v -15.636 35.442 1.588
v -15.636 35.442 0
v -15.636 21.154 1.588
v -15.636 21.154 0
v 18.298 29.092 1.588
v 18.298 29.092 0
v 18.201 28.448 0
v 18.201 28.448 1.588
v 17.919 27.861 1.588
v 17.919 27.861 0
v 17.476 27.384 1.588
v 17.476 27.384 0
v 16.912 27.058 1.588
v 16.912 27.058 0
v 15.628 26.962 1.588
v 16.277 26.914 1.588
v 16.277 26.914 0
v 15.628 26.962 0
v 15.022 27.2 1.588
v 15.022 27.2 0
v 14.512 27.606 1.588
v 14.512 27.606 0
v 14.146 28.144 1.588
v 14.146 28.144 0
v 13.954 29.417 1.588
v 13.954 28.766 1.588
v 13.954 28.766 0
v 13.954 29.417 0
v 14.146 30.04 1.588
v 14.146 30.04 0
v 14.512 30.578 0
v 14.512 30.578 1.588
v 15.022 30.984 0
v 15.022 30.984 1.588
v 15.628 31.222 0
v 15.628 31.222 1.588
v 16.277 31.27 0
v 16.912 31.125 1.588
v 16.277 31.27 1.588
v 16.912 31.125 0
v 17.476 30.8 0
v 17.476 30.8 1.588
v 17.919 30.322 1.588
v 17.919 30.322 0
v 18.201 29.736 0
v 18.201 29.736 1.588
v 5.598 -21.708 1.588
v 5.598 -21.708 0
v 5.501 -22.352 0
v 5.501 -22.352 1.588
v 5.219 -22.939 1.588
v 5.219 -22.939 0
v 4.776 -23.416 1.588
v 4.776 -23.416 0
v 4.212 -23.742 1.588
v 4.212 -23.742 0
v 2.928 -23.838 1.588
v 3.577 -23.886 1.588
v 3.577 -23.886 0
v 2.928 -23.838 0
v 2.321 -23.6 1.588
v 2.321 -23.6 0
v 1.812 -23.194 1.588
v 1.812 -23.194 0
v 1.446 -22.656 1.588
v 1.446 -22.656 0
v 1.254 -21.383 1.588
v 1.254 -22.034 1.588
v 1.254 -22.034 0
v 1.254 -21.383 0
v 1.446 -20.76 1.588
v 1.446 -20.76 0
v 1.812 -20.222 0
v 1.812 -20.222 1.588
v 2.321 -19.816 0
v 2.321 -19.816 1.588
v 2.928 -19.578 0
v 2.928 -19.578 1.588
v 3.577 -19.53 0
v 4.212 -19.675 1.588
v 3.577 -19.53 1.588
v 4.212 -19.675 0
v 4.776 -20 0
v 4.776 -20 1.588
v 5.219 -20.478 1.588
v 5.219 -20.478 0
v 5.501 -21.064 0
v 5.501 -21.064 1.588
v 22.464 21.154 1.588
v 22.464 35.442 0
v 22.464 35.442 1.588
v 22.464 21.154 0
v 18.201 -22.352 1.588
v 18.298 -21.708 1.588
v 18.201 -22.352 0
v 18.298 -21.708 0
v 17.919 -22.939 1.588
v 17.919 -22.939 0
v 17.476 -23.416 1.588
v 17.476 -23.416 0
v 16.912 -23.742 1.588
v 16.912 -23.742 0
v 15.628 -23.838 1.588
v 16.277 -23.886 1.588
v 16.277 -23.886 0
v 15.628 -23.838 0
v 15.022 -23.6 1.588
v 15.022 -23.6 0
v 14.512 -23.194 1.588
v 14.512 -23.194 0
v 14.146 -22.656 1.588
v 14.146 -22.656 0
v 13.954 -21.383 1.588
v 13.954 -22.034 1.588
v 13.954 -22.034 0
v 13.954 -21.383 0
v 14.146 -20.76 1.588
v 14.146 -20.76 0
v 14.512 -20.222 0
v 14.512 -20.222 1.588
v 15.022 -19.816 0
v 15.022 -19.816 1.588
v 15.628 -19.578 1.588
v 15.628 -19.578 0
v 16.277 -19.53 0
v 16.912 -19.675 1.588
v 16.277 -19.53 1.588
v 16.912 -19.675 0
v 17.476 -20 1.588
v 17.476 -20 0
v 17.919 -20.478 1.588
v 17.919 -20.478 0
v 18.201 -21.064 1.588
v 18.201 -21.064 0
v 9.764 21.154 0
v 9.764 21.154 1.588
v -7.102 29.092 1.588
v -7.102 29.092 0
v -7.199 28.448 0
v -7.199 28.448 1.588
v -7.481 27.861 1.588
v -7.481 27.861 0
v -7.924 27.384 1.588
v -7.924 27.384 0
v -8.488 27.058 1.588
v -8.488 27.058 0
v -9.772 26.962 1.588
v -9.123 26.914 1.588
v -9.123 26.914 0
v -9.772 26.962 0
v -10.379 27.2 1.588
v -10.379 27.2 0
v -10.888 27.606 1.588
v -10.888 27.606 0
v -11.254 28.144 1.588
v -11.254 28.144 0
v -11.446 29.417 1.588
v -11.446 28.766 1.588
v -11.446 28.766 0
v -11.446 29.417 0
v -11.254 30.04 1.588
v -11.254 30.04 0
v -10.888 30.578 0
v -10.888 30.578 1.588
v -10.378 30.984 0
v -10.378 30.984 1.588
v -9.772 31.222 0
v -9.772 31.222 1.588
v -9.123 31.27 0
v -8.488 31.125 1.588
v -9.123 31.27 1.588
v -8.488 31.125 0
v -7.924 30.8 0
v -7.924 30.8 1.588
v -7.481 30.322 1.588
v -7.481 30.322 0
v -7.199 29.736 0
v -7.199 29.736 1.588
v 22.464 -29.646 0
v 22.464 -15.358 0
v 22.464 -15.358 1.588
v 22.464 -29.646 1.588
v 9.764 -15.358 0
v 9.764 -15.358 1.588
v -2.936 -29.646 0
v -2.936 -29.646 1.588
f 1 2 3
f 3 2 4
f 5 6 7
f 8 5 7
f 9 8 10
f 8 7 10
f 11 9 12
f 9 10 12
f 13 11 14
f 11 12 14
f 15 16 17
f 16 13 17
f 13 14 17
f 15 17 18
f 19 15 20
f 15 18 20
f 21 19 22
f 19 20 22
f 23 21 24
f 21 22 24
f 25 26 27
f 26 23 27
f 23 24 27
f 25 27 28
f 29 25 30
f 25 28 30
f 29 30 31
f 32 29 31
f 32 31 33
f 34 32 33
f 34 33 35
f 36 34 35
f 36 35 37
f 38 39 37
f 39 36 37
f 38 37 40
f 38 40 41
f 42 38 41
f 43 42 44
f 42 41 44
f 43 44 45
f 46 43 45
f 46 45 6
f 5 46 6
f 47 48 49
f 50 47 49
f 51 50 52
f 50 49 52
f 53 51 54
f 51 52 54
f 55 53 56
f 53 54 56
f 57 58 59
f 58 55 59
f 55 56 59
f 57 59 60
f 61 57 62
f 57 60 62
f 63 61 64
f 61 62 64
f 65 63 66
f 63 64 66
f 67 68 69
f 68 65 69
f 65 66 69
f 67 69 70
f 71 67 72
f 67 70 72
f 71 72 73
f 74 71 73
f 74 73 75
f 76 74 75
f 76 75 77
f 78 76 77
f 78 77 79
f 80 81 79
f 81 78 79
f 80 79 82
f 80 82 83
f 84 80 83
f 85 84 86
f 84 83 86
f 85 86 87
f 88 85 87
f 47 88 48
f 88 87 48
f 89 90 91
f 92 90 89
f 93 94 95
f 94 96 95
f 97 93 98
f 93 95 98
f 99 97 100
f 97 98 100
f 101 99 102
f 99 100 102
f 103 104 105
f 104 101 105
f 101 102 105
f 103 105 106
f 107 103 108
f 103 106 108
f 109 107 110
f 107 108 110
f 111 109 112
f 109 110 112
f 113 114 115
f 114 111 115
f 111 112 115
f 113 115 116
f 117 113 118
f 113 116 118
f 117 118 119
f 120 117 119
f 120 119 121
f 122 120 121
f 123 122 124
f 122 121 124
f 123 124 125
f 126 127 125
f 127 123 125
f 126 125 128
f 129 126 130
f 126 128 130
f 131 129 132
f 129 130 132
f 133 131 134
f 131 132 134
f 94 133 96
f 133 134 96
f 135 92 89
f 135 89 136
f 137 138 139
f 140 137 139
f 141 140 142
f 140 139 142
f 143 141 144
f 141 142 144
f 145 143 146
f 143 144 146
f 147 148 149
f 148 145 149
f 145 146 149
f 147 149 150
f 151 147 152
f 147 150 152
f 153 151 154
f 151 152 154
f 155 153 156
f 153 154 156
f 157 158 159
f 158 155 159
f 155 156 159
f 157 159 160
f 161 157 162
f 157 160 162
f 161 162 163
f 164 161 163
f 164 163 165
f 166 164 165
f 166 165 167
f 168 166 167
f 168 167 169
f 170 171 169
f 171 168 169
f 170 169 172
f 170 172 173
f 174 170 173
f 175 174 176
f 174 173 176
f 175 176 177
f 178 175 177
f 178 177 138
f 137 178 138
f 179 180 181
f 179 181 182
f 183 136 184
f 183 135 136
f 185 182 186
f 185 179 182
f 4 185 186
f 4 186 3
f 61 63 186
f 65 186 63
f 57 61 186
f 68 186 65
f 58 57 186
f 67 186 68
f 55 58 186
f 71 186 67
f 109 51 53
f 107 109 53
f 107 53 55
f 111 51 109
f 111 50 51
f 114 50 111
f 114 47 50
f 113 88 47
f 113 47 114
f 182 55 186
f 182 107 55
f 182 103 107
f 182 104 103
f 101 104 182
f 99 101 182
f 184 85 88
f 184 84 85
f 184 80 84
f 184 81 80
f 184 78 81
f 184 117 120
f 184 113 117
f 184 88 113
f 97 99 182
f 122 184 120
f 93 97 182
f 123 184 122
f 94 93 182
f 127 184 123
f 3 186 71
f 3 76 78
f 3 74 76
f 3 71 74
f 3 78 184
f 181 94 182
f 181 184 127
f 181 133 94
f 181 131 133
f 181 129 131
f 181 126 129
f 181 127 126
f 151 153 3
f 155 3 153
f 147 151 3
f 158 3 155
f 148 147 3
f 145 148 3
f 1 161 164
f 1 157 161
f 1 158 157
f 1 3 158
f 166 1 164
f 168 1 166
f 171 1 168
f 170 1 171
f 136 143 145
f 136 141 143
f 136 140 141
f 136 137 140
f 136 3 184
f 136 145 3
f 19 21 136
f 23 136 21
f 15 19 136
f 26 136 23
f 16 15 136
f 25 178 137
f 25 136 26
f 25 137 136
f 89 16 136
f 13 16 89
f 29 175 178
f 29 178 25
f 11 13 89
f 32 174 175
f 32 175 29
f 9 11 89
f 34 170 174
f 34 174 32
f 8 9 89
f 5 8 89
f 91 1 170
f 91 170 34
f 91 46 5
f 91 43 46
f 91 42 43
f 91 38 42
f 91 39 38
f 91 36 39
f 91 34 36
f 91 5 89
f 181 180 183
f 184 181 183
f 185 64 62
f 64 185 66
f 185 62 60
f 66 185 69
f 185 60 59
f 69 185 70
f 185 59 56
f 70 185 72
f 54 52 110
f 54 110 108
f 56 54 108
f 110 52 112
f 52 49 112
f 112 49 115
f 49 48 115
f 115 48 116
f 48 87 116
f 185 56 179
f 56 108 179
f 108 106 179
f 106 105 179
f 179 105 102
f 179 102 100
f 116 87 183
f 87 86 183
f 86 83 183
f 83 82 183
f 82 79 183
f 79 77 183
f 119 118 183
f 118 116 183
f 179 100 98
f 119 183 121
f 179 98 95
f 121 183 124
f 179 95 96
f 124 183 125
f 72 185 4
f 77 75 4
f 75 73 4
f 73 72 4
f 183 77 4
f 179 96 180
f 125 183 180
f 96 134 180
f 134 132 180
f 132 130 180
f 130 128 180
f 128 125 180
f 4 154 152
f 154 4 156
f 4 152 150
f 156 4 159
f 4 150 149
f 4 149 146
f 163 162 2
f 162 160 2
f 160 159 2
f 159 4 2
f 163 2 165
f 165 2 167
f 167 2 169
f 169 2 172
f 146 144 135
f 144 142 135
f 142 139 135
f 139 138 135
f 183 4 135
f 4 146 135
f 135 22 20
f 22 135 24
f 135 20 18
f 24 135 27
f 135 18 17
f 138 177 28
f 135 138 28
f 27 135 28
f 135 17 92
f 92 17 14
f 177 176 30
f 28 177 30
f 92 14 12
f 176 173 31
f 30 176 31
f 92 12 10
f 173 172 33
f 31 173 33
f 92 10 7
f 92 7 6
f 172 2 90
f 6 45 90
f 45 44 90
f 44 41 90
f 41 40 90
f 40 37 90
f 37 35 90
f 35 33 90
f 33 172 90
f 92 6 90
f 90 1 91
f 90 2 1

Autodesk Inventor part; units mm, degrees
ref_plane "YZ Plane" through (0, 0, 0) normal (1, 0, 0) x (0, 1, 0)
ref_plane "XZ Plane" through (0, 0, 0) normal (0, 1, 0) x (-1, 0, 0)
ref_plane "XY Plane" through (0, 0, 0) normal (0, 0, 1) x (1, 0, 0)
sketch "Sketch1" plane through (0, 0, 0) normal (0, 0, 1) x (1, 0, 0)
  line L0 (-15.6363, 35.4419) -> (22.4637, 35.4419)
  line L1 (22.4637, 35.4419) -> (22.4637, 21.1544)
  line L2 (22.4637, -15.3581) -> (22.4637, -29.6456)
  line L3 (-2.9363, -29.6456) -> (-15.6363, 21.1544)
  line L4 (22.4637, 21.1544) -> (9.7637, 21.1544)
  line L5 (9.7637, 21.1544) -> (9.7637, -15.3581)
  line L6 (-15.6363, 35.4419) -> (-15.6363, 21.1544)
  line L7 (22.4637, -15.3581) -> (9.7637, -15.3581)
  line L8 (22.4637, -29.6456) -> (-2.9363, -29.6456)
  circle A0 centre (16.1137, 29.0919) radius 2.1844
  circle A1 centre (-9.2863, 29.0919) radius 2.1844
  circle A2 centre (16.1137, -21.7081) radius 2.1844
  circle A3 centre (3.4137, -21.7081) radius 2.1844
  point P0 (0, 0)
  dimension "d0" = 38.1
  dimension "d1" = 12.7
extrude "Extrusion1" add sketch "Sketch1" along normal blind 1.5875
properties part number "FrontFunnelTop"
